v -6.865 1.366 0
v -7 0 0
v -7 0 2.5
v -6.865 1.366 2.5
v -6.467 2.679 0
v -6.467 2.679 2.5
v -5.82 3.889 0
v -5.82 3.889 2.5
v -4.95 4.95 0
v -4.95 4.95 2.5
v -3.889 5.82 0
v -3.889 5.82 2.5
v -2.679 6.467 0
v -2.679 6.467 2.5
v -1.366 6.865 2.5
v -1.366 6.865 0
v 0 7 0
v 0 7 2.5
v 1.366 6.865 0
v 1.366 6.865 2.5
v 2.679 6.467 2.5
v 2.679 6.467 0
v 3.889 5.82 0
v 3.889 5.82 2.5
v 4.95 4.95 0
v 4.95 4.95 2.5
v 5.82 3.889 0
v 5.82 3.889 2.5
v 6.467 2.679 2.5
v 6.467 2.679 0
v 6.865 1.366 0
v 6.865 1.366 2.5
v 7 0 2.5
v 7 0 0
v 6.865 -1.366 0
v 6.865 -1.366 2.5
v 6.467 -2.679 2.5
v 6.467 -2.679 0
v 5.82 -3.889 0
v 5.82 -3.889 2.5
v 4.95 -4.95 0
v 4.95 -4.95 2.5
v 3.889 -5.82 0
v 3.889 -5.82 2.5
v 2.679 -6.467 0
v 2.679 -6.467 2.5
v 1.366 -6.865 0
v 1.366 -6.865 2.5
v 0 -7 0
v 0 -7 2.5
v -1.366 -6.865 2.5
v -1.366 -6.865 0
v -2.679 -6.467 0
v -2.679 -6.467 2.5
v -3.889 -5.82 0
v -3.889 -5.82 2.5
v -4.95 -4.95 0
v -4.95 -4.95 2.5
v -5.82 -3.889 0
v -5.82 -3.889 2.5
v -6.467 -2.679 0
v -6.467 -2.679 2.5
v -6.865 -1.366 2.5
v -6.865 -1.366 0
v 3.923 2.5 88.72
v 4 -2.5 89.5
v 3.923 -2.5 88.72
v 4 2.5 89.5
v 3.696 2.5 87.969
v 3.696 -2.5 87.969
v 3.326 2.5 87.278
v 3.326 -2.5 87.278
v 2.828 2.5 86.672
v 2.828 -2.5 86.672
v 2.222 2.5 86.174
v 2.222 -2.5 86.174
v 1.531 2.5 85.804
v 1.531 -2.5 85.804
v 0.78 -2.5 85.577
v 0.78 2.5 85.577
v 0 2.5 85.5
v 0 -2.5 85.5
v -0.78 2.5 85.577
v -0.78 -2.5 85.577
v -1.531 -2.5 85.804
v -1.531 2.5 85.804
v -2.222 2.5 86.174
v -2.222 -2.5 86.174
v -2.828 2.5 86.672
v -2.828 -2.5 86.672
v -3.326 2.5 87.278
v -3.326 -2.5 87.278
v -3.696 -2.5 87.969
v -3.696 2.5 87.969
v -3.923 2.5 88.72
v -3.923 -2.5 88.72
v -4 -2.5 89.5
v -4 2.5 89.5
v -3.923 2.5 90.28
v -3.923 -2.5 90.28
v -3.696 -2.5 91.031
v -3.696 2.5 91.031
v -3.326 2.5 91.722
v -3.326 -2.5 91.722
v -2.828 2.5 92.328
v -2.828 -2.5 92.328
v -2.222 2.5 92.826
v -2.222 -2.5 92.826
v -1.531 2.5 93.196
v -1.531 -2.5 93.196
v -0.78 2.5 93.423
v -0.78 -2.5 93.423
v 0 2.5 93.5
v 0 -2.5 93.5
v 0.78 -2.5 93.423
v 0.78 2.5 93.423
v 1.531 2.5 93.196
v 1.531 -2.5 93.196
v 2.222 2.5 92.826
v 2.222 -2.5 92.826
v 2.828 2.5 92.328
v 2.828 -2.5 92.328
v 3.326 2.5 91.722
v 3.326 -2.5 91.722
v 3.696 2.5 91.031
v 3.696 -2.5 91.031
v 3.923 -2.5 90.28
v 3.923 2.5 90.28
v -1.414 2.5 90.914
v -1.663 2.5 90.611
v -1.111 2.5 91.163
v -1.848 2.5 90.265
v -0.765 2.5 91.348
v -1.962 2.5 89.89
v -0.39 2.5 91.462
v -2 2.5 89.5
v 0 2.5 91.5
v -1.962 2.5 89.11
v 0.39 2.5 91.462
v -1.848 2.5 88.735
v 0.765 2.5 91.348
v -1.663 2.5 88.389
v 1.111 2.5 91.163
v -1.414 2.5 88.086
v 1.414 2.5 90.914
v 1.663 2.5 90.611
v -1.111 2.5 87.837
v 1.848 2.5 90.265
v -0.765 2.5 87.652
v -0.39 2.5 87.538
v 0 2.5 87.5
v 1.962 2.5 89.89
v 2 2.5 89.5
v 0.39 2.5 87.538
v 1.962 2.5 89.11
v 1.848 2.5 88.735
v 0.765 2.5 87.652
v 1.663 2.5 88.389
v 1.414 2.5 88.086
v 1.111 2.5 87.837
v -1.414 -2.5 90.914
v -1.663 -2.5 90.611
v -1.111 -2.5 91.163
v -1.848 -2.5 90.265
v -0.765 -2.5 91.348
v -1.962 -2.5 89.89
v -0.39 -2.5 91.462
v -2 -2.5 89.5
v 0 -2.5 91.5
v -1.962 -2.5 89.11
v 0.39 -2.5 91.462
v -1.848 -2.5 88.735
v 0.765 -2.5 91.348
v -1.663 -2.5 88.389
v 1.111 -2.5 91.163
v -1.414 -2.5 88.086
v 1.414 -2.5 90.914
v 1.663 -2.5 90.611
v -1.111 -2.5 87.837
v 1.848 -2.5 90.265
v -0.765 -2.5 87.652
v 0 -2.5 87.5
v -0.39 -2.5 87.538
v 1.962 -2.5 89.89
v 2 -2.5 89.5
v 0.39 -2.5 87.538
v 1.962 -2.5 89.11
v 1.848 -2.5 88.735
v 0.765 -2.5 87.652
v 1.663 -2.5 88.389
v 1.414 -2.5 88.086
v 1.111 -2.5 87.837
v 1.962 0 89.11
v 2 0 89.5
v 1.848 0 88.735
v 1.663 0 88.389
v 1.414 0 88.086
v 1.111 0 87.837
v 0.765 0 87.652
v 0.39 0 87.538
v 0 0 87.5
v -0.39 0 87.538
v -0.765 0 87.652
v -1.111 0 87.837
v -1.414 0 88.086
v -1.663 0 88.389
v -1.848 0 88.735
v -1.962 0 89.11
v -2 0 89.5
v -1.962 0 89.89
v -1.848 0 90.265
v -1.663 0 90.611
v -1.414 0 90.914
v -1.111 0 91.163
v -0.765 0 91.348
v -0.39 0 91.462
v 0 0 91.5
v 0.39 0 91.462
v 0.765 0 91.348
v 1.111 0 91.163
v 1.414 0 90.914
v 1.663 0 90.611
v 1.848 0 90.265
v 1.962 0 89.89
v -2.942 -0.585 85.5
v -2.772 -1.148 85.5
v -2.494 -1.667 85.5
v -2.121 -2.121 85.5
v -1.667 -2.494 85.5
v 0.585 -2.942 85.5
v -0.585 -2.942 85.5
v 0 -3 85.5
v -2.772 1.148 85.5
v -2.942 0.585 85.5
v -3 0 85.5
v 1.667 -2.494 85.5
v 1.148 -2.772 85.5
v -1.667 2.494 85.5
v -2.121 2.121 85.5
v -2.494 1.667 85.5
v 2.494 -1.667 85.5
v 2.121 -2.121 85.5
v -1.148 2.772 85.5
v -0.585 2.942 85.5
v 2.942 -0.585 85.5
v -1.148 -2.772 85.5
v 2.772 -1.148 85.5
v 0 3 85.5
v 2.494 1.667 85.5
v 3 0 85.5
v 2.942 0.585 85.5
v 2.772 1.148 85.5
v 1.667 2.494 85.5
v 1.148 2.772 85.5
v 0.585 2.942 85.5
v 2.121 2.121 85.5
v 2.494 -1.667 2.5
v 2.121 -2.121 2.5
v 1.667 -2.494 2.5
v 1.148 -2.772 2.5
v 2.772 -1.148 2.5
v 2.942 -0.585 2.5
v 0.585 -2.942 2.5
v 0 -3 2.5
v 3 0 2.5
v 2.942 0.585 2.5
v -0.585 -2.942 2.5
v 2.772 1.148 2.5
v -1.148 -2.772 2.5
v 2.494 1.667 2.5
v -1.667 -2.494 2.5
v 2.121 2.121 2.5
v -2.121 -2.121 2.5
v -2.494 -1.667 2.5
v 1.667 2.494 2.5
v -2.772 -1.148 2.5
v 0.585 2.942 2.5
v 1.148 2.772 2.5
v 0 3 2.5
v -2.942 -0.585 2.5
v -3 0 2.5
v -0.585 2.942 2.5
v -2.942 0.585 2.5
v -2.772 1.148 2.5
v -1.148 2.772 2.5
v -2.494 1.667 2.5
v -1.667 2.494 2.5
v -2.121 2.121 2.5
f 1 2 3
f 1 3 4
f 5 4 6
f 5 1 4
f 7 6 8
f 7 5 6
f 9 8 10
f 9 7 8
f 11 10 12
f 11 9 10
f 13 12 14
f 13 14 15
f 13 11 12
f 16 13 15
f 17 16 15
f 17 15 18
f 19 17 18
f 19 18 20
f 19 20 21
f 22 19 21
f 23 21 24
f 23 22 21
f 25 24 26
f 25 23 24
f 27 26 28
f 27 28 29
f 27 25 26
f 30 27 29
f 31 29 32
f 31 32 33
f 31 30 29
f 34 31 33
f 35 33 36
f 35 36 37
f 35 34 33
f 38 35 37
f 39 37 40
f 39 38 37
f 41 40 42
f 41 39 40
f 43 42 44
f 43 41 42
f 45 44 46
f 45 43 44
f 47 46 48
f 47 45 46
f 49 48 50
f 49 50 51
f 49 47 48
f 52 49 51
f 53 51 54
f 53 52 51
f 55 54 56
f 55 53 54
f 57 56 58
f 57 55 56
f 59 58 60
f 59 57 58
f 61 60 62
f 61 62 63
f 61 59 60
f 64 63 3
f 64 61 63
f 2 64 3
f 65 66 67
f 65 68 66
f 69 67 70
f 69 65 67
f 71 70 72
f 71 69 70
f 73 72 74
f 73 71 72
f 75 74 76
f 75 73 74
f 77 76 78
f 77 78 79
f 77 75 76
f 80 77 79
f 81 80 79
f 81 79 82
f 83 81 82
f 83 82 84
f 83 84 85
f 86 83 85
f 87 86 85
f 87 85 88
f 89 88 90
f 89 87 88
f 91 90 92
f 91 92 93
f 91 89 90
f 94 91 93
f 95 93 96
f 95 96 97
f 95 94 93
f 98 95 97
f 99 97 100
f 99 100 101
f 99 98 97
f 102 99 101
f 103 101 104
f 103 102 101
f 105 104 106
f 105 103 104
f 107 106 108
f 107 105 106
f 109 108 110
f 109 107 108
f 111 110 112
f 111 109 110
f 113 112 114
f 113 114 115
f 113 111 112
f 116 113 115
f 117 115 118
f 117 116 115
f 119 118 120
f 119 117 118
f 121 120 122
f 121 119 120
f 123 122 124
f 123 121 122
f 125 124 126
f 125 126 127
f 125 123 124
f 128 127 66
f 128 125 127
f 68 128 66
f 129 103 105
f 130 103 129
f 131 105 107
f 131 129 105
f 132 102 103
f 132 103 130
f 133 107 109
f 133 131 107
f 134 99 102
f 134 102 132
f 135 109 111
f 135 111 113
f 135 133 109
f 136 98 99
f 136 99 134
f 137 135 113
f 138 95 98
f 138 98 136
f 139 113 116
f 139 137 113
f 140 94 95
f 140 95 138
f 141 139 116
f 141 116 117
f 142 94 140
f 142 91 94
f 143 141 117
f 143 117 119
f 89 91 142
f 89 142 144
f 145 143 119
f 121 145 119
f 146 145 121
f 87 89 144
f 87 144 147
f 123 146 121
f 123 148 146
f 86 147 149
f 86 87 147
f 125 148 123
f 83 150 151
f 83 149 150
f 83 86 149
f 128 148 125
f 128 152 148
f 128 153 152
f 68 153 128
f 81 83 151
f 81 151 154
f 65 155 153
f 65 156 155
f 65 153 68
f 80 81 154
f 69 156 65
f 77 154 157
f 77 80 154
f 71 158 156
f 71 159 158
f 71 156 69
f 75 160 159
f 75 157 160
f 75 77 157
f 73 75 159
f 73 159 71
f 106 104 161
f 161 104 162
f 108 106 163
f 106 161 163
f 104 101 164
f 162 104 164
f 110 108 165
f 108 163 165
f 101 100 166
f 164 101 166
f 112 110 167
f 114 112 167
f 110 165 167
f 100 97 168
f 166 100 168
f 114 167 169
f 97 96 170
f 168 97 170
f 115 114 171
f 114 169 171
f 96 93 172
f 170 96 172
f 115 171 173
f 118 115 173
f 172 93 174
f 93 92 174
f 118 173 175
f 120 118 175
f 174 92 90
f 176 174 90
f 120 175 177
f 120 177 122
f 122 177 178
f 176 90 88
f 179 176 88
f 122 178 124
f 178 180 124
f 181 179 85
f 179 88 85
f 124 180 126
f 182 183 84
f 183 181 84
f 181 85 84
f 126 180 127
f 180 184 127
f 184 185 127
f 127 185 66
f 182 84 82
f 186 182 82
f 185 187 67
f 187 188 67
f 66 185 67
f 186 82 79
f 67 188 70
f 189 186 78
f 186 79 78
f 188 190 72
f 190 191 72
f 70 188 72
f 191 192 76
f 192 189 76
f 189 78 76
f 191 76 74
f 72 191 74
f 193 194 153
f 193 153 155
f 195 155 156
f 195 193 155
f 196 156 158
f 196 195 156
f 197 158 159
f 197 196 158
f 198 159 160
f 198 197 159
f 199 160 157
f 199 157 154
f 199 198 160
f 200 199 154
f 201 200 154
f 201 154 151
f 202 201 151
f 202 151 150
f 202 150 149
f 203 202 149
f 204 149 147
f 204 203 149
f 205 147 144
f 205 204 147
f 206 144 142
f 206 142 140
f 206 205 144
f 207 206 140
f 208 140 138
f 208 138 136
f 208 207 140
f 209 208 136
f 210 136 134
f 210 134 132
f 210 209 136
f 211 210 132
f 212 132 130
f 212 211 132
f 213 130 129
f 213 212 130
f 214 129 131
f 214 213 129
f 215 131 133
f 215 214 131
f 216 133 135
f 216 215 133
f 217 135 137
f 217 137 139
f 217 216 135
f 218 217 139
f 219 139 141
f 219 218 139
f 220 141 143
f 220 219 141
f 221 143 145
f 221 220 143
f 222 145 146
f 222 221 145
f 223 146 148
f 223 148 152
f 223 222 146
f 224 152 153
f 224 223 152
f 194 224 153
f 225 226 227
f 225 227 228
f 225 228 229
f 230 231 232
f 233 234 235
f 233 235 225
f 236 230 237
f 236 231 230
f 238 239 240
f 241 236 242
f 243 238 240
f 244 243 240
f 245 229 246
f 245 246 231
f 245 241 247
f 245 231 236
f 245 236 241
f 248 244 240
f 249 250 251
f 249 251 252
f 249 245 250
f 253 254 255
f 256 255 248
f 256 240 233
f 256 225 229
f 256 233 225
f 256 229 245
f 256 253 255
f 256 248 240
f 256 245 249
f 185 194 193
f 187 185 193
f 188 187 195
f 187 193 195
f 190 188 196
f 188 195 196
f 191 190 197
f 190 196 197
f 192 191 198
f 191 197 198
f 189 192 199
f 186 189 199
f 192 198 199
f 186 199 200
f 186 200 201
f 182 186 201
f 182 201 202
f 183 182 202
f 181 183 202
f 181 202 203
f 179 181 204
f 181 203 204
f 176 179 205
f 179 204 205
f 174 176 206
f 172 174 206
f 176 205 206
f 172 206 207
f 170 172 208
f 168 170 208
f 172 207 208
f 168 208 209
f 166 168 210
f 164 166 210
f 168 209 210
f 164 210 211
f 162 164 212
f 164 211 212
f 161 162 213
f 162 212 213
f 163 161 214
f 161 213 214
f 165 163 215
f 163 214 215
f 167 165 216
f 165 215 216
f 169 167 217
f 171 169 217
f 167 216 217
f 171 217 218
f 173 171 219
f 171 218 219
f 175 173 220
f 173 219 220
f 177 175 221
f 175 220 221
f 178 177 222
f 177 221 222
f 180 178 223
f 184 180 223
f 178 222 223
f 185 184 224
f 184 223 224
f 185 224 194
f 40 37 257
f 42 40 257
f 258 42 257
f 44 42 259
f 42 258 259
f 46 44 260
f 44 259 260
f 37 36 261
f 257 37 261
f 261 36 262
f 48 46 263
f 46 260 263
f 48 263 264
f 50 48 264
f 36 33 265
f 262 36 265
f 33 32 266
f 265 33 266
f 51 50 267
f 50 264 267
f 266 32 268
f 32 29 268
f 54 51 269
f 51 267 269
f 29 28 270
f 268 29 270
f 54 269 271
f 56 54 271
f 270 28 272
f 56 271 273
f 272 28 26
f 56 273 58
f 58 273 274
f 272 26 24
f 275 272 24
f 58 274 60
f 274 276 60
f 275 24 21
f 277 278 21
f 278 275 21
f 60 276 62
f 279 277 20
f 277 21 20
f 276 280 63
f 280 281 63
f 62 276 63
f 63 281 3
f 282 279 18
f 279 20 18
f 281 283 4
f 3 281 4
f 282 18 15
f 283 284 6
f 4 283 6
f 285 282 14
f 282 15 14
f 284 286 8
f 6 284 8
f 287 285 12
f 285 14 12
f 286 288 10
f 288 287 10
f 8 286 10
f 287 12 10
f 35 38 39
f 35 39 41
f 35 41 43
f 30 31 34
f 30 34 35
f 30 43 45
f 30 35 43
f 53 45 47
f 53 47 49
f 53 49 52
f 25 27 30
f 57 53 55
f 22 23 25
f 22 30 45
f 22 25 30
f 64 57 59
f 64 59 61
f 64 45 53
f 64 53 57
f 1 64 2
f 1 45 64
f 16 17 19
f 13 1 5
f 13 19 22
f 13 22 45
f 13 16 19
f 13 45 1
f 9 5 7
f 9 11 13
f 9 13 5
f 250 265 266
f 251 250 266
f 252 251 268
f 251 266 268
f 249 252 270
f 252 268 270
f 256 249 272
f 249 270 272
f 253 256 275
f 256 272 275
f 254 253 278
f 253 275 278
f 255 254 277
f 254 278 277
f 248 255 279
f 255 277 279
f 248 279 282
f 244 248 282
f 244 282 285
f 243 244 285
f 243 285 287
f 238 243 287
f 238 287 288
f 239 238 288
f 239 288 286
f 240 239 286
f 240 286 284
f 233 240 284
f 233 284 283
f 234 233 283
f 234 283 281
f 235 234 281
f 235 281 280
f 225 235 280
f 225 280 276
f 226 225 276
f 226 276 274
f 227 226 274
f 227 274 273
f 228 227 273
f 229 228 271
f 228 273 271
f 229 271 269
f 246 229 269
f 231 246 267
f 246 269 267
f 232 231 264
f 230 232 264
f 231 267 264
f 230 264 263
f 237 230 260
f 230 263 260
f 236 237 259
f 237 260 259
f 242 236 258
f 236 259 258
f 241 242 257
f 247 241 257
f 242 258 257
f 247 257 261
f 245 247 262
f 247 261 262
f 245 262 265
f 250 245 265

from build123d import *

# Parameters (mm, degrees)
SKETCH1_R                = 3
BOSS_EXTRUDE1_DEPTH      = 85.5
BOSS_EXTRUDE2_DEPTH      = 2.5
BOSS_EXTRUDE2_DEPTH_BACK = 2.5
SKETCH2_R                = 4
SKETCH2_R_2              = 2
SKETCH3_R                = 7
BOSS_EXTRUDE3_DEPTH      = 2.5


with BuildPart() as part:
    # Sketch1 → Boss-Extrude1 (new body)
    with BuildSketch(Plane.XY):
        Circle(SKETCH1_R)
    extrude(amount=BOSS_EXTRUDE1_DEPTH)

    # Sketch3 → Boss-Extrude3 (add)
    with BuildSketch(Plane(origin=(0, 0, 0), x_dir=(-1, 0, 0), z_dir=(0, 0, -1))):
        Circle(SKETCH3_R)
    extrude(amount=-BOSS_EXTRUDE3_DEPTH)


with BuildPart() as body_2:
    # Sketch2 → Boss-Extrude2 (new, two sides: drawn at the far end of the back side and taken through both)
    with BuildSketch(Plane(origin=(0, 0, 0), x_dir=(1, 0, 0), z_dir=(0, 1, 0)).offset(-BOSS_EXTRUDE2_DEPTH_BACK)):
        with Locations((0, -89.5)):
            Circle(SKETCH2_R)
        with Locations((0, -89.5)):
            Circle(SKETCH2_R_2, mode=Mode.SUBTRACT)
    extrude(amount=BOSS_EXTRUDE2_DEPTH + BOSS_EXTRUDE2_DEPTH_BACK)


solid = Compound([part.part, body_2.part])
